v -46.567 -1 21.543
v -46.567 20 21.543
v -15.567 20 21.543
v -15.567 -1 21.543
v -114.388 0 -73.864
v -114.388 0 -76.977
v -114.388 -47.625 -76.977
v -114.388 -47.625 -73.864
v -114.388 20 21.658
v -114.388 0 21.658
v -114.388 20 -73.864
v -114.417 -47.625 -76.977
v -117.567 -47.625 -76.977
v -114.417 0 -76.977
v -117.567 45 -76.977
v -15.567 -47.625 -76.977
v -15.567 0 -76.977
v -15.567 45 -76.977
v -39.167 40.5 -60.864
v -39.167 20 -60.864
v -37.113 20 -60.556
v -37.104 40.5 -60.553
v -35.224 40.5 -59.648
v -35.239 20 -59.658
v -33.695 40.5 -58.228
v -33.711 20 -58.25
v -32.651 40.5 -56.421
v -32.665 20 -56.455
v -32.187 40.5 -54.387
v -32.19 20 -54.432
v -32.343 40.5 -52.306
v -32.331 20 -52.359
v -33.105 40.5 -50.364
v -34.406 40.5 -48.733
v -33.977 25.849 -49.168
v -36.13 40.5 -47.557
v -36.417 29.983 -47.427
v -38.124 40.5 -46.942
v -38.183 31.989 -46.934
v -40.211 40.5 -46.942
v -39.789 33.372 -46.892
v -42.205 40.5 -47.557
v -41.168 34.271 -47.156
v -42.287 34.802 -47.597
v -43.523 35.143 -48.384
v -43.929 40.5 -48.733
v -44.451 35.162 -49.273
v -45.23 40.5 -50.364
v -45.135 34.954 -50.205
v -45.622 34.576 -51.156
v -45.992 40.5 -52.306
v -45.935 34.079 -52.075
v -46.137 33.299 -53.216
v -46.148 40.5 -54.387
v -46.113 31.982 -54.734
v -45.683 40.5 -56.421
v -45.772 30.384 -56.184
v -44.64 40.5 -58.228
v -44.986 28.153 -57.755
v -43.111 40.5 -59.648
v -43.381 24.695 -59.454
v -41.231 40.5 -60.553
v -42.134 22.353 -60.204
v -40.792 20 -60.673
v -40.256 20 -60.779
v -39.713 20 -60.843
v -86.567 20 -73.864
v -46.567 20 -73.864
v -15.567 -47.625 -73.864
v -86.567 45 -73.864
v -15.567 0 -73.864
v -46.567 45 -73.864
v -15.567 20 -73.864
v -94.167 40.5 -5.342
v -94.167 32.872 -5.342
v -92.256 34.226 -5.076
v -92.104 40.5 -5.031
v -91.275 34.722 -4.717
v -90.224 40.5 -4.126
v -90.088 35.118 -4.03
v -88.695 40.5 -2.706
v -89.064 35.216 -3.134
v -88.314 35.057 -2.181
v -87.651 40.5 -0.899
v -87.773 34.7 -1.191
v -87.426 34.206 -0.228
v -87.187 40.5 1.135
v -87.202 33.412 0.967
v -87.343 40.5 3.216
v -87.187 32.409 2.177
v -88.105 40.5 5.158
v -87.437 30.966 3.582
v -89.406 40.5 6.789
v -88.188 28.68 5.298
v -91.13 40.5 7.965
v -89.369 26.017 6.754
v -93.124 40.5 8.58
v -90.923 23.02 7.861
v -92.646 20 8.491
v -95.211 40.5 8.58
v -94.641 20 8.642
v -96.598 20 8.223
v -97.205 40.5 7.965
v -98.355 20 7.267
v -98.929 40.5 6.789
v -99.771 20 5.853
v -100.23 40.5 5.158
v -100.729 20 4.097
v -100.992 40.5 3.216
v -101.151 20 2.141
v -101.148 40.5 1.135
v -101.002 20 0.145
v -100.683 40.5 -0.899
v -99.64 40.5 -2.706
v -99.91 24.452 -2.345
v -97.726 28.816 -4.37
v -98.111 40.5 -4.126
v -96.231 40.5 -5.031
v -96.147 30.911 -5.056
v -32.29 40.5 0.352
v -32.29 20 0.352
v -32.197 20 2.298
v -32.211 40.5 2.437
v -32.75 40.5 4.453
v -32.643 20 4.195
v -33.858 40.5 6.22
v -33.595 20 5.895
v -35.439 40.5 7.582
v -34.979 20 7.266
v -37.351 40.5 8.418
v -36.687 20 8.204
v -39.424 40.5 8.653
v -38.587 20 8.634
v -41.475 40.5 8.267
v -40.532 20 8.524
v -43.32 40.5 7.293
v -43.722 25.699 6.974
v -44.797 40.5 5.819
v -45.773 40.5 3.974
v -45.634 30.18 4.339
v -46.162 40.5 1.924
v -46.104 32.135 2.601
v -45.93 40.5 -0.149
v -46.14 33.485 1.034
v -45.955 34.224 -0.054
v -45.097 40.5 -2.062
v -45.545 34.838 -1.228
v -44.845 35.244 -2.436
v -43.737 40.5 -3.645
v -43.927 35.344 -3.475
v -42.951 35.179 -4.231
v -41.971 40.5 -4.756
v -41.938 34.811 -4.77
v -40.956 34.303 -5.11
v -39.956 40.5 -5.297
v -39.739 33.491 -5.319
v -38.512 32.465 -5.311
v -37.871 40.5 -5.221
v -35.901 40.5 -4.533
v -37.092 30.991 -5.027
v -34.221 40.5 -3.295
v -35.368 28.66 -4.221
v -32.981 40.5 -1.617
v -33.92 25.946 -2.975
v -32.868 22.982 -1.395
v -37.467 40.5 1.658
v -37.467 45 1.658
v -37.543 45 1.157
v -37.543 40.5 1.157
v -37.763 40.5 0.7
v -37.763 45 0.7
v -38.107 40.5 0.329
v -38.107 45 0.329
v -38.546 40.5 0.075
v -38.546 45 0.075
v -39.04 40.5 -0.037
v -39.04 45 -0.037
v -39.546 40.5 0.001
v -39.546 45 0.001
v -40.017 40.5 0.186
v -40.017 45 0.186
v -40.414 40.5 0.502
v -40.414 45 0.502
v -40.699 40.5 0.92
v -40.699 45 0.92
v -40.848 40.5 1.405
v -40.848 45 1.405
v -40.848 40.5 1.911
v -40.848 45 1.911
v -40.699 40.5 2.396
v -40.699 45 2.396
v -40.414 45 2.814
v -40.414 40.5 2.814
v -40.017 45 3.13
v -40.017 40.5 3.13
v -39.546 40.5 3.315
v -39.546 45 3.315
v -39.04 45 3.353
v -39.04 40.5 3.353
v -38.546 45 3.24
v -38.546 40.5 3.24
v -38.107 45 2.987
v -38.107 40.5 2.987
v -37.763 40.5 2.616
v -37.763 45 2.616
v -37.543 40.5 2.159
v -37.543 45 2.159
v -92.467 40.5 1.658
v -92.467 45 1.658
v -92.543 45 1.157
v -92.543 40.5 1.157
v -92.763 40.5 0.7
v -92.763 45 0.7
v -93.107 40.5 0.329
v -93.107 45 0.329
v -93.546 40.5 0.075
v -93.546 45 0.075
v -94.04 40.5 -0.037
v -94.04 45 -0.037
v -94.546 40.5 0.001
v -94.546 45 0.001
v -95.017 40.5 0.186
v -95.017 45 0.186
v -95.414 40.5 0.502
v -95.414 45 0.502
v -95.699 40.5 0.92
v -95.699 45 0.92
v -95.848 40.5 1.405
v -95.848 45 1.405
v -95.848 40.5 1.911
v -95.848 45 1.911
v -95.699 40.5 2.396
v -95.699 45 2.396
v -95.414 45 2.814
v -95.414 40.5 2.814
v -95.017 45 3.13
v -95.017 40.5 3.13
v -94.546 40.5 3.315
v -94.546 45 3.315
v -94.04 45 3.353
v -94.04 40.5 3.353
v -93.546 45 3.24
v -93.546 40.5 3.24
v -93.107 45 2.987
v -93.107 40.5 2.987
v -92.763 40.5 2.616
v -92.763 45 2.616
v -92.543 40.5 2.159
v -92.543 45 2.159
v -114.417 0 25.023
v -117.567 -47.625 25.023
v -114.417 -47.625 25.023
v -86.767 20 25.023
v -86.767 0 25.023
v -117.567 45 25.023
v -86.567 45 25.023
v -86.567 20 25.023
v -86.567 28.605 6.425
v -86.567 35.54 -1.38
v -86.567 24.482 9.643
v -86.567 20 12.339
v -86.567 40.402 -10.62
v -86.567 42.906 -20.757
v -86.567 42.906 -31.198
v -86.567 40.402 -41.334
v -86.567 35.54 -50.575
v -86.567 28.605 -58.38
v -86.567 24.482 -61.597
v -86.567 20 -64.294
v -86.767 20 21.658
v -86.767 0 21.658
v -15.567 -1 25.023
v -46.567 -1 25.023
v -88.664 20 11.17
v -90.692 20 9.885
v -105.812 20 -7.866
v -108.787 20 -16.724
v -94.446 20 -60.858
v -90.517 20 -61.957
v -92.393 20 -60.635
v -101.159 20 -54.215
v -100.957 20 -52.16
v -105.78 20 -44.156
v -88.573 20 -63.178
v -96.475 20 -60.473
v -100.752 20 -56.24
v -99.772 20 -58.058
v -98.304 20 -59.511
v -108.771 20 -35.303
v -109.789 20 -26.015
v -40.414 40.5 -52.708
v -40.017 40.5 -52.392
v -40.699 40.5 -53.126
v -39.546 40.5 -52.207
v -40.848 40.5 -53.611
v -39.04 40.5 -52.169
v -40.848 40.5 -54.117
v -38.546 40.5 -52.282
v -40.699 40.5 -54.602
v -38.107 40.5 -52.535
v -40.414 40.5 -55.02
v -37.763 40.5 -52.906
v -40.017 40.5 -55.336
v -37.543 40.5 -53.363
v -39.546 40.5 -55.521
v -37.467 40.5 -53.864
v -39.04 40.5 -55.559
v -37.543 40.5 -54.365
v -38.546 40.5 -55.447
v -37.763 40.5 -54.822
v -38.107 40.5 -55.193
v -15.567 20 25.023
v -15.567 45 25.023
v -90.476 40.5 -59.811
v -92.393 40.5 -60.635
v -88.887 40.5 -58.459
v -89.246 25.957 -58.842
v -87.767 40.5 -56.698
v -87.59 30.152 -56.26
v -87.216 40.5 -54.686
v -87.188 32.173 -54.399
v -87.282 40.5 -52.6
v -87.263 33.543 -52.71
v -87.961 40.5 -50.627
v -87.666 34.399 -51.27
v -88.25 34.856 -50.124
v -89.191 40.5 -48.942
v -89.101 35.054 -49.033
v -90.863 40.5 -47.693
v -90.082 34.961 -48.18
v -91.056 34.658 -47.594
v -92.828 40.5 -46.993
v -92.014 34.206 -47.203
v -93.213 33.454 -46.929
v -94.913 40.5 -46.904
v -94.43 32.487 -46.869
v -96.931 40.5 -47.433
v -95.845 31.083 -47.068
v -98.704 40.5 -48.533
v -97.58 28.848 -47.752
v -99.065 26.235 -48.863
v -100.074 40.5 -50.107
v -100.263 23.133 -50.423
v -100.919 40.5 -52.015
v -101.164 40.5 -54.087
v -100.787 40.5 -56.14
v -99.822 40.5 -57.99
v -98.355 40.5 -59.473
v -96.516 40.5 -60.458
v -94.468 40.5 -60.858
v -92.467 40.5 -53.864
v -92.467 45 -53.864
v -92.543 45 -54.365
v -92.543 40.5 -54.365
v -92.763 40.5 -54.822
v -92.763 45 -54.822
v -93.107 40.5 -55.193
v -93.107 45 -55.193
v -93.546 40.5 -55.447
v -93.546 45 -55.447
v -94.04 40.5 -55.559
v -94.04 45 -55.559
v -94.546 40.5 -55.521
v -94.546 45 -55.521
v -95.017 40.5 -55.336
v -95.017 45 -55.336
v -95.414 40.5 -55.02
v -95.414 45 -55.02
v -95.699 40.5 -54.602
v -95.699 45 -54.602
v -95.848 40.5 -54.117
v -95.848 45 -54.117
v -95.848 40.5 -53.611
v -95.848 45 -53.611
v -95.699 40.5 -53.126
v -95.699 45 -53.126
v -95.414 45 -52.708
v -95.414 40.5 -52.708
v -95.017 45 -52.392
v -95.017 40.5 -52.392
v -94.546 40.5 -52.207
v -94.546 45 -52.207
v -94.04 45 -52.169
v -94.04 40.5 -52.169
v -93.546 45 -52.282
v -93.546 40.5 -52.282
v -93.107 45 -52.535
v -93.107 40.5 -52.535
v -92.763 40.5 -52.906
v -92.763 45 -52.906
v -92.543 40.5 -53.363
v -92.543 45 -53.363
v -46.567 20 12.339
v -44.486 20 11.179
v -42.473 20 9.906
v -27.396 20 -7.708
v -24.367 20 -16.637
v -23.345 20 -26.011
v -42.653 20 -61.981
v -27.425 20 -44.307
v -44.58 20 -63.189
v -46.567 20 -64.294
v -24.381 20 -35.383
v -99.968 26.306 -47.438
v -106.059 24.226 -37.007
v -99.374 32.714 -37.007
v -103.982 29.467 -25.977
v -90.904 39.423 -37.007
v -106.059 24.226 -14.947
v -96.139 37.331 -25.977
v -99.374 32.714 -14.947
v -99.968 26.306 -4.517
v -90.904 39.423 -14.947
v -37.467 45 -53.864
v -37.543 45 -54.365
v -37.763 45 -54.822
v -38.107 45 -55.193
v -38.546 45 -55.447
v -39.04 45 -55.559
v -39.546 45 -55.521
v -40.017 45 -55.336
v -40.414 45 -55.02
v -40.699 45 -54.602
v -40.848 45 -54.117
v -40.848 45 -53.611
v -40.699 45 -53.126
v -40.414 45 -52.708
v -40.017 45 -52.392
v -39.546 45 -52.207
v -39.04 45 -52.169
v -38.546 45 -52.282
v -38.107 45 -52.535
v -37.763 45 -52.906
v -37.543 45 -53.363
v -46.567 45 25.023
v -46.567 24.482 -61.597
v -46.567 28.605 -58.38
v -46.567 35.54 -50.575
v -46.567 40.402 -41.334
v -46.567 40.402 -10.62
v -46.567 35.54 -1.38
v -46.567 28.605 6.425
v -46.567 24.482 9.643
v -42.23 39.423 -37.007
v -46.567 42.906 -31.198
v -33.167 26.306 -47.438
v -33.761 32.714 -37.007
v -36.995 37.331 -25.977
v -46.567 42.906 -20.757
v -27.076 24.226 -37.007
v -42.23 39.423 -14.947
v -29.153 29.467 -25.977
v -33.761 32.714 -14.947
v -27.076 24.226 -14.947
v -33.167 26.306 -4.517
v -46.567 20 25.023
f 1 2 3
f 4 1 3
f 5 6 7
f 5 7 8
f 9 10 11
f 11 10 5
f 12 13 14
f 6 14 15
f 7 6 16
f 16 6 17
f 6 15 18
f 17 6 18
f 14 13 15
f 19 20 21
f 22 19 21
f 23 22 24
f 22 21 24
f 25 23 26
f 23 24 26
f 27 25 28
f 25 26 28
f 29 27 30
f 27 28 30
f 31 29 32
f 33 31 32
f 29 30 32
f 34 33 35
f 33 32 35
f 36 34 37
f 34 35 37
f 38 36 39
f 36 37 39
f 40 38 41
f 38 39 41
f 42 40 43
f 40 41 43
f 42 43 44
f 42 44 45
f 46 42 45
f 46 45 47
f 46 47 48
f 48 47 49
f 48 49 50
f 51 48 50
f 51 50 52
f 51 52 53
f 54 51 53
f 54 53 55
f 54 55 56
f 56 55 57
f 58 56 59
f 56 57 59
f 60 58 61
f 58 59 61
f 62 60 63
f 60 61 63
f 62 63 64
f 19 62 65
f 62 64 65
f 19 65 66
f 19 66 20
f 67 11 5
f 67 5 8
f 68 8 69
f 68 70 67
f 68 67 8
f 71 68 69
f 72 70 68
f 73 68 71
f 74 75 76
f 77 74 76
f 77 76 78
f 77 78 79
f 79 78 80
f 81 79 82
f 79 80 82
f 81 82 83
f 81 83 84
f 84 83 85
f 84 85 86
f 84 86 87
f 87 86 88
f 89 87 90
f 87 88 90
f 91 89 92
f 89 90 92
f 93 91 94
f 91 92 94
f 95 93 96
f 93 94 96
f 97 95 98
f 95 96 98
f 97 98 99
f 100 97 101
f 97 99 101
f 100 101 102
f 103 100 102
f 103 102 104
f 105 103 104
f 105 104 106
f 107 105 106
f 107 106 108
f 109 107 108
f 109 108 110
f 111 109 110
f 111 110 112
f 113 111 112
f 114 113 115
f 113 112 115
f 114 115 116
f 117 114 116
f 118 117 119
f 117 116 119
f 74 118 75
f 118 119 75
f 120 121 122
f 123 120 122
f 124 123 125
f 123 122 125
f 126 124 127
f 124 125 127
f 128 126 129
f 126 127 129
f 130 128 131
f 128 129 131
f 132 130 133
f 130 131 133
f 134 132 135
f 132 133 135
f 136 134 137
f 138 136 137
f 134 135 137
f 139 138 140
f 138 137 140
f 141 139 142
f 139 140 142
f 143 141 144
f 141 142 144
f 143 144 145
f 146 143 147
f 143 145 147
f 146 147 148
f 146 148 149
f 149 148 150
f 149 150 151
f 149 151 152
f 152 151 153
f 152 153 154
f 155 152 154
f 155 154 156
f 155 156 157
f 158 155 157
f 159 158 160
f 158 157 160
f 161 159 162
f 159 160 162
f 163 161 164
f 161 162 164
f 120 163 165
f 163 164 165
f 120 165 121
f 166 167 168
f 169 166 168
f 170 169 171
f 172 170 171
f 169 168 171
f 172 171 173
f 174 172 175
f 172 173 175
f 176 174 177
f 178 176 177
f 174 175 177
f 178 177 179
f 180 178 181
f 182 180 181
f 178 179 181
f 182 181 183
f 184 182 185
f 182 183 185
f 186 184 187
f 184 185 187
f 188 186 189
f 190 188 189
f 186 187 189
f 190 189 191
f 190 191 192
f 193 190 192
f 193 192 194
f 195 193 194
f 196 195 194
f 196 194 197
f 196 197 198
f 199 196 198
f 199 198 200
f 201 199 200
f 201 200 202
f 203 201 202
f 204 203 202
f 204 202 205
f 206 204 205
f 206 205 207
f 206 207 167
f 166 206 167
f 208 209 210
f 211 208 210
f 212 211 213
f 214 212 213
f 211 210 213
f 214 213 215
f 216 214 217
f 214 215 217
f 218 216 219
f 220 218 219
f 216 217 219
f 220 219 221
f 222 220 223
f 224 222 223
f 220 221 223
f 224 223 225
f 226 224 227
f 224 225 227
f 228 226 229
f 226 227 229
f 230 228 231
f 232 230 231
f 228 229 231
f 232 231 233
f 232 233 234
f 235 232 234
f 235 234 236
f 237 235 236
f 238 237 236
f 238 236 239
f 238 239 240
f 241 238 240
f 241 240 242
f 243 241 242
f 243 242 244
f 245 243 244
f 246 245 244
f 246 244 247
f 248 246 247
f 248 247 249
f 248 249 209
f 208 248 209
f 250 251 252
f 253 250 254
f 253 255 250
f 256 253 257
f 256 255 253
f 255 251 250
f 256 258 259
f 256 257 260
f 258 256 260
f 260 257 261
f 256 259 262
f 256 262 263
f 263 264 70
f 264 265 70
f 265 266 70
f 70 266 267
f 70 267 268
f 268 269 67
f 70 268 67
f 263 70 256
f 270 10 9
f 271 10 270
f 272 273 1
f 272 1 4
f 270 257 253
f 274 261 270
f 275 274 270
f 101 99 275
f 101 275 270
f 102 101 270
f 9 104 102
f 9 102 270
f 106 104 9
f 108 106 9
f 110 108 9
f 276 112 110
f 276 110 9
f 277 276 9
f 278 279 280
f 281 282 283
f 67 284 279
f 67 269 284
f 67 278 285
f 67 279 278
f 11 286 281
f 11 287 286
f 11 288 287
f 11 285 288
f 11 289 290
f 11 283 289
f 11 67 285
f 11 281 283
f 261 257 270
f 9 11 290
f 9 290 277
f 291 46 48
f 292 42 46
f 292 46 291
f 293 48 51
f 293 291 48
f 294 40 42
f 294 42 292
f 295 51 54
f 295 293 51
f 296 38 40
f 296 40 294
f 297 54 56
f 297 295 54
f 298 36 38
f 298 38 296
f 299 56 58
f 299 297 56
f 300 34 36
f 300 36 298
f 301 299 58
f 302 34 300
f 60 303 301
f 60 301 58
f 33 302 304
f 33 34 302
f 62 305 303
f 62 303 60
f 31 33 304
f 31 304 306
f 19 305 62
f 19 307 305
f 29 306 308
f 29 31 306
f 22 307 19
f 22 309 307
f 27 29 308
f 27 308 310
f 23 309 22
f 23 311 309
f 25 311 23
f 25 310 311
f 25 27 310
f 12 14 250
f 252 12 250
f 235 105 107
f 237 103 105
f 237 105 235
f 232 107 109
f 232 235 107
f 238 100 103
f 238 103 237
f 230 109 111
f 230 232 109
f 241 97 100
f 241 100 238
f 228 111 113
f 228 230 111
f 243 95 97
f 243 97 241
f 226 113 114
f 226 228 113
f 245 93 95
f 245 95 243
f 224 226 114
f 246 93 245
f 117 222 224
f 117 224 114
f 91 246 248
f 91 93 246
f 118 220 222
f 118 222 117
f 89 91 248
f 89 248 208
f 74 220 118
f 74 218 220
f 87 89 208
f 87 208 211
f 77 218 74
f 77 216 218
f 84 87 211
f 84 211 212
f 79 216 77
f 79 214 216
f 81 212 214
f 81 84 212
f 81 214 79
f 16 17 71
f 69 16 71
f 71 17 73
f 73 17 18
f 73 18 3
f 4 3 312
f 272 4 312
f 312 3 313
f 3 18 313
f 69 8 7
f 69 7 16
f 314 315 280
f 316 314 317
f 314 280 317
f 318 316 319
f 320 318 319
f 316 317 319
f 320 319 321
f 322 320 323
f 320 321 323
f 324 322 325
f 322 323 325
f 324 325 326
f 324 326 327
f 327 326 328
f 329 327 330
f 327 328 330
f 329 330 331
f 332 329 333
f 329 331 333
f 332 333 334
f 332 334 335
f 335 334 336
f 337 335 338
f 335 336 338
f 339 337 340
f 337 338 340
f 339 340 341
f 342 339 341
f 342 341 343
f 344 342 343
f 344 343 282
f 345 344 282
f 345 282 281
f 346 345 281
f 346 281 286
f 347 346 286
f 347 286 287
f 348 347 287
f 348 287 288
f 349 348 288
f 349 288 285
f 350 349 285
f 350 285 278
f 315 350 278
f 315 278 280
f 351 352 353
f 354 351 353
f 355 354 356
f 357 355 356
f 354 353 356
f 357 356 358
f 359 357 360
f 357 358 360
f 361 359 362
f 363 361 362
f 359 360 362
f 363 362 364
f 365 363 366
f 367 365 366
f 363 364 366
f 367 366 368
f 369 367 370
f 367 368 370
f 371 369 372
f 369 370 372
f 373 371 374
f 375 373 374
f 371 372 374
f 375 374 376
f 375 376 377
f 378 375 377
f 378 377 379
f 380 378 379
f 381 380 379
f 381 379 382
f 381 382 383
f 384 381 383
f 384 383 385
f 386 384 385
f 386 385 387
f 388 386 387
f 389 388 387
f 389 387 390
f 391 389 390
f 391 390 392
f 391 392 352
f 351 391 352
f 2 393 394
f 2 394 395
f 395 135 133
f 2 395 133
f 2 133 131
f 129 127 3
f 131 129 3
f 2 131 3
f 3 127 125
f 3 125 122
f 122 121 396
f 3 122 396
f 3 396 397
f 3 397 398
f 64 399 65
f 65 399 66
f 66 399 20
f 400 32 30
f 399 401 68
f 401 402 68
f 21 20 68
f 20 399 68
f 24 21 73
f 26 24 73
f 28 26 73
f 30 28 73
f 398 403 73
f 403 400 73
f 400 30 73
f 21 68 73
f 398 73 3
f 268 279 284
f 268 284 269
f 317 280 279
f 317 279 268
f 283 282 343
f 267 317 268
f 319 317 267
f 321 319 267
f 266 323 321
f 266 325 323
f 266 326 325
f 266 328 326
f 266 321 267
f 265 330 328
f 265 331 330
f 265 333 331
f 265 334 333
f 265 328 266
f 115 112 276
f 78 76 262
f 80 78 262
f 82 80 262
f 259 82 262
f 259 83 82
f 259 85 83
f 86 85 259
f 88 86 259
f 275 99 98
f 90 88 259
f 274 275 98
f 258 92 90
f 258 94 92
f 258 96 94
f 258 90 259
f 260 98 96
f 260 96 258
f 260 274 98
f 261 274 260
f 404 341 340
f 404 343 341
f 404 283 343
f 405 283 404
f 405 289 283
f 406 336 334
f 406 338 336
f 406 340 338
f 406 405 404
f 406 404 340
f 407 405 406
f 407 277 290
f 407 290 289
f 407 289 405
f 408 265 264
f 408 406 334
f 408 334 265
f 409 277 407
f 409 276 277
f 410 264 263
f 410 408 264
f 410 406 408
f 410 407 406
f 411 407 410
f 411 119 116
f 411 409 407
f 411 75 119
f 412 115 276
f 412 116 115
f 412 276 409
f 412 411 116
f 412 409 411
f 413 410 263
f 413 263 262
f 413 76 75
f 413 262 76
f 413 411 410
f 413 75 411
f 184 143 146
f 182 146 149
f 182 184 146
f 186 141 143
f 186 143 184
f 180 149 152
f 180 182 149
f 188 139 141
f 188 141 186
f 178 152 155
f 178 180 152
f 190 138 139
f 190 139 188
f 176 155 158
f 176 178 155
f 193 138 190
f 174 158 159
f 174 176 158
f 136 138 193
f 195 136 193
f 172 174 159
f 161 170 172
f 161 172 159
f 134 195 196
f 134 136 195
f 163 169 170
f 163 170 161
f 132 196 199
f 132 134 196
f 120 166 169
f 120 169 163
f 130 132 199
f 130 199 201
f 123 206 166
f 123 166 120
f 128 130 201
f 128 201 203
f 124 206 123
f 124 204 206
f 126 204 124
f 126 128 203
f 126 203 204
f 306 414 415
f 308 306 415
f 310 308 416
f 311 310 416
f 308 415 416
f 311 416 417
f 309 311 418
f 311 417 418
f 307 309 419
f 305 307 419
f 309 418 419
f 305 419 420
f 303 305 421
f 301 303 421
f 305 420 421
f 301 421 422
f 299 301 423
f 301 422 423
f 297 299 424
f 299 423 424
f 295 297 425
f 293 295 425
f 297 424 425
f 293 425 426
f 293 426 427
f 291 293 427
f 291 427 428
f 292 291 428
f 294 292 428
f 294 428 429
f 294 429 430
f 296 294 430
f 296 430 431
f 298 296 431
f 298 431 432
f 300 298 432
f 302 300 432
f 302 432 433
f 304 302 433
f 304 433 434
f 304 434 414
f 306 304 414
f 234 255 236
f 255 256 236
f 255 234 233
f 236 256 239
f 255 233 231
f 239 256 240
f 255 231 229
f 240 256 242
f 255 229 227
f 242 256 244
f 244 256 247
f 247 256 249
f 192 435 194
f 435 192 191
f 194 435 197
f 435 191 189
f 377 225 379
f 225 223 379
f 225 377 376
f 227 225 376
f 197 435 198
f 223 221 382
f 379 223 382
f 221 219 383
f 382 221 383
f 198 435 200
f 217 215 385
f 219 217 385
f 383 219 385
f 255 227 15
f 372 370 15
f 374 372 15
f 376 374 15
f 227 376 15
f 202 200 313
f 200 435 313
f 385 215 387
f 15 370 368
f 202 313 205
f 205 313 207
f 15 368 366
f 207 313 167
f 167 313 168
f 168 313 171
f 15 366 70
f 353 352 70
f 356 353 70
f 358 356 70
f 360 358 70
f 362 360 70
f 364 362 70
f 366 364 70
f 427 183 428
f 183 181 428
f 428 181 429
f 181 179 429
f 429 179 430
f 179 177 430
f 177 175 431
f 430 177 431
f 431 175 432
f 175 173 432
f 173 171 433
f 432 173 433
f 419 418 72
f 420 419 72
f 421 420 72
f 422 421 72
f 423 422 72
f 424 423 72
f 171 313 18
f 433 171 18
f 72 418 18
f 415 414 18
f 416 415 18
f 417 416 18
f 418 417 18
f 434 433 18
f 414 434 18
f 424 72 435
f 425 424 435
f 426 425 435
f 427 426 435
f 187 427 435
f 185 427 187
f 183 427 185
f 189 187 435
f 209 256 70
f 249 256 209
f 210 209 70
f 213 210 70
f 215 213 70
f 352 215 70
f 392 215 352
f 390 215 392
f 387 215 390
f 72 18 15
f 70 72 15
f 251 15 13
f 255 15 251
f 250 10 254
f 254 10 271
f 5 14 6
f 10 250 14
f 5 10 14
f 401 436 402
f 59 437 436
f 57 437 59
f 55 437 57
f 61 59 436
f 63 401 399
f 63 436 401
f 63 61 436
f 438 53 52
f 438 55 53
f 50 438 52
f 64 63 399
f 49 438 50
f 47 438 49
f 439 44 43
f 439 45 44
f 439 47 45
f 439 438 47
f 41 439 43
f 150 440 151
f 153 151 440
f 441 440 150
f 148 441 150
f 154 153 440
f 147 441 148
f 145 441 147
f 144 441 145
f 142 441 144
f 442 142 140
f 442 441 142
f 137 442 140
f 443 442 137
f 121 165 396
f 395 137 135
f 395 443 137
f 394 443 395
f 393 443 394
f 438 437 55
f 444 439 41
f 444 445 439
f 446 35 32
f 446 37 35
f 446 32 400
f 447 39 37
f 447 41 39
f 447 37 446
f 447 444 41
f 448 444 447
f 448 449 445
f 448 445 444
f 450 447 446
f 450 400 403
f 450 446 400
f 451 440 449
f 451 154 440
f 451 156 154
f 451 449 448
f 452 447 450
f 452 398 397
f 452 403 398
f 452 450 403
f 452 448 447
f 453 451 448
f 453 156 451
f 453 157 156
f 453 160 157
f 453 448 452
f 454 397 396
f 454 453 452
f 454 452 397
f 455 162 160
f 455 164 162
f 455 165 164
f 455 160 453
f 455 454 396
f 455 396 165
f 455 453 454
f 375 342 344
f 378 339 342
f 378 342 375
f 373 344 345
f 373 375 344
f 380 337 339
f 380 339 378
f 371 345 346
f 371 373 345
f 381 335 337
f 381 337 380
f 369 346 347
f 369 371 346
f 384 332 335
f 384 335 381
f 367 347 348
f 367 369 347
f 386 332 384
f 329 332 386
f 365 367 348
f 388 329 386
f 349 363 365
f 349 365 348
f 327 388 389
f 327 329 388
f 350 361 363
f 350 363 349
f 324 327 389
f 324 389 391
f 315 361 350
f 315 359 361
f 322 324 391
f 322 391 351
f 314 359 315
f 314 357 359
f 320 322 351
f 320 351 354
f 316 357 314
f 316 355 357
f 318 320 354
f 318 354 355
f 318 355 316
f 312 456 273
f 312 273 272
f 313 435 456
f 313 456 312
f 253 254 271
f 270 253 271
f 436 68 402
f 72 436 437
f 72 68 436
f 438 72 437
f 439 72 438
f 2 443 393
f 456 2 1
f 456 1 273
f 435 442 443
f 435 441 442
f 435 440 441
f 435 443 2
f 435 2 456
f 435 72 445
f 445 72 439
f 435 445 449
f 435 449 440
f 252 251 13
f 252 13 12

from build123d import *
from build123d.topology import SkipClean

# Parameters (mm, degrees)
SKETCH1_W                   = 102
SKETCH1_H                   = 102
BOSS_EXTRUDE1_DEPTH         = 50
CUT_EXTRUDE_THIN1_OUTLINE_W = 40
CUT_EXTRUDE_THIN1_OUTLINE_H = 95.773670058
CUT_EXTRUDE_THIN1_DEPTH     = 50
SKETCH4_W                   = 40
SKETCH4_H                   = 6.202657501
CUT_EXTRUDE3_DEPTH          = 54
SKETCH5_W                   = 33.817621941
SKETCH5_H                   = 102.594578927
CUT_EXTRUDE4_DEPTH          = 20
SKETCH6_W                   = 27.820383201
SKETCH6_H                   = 98.886835029
CUT_EXTRUDE5_DEPTH          = 20
SKETCH7_W                   = 30.8
SKETCH7_H                   = 3.364819678
BOSS_EXTRUDE2_DEPTH         = 21
SKETCH9_W                   = 31
SKETCH9_H                   = 3.479961613
BOSS_EXTRUDE4_DEPTH         = 21
SKETCH10_W                  = 3.15002448
SKETCH10_H                  = 102
BOSS_EXTRUDE5_DEPTH         = 47.625
SKETCH11_W                  = 98.820383201
SKETCH11_H                  = 3.113164971
BOSS_EXTRUDE6_DEPTH         = 47.625
SKETCH14_W                  = 102
SKETCH14_H                  = 5
CUT_EXTRUDE7_DEPTH          = 105
SKETCH17_R                  = 7
CUT_EXTRUDE12_DEPTH         = 20.5
M3_CLEARANCE_HOLE1_D        = 3.4


# Read off the part's stored shape, not the designer's step: Cut-Extrude-Thin1
with BuildPart() as part:
    # Sketch1 → Boss-Extrude1 (new body)
    with BuildSketch(Plane(origin=(0, 0, 0), x_dir=(1, 0, 0), z_dir=(0, 1, 0))):
        with Locations((-66.567363259, 25.977216604)):
            Rectangle(SKETCH1_W, SKETCH1_H)
    extrude(amount=BOSS_EXTRUDE1_DEPTH)

    # Sketch2 → Cut-Revolve1 (revolve, cut)
    with SkipClean():  # the faces are left unmerged after this step: merging them gives an invalid solid
        with BuildSketch(Plane(origin=(0, 0, 0), x_dir=(1, 0, 0), z_dir=(0, 1, 0))):
            with BuildLine():
                ThreePointArc((-66.567363259, 73.602216604), (-114.192363259, 25.977216604), (-66.567363259, -21.647783396))
                Line((-66.567363259, -21.647783396), (-66.567363259, 73.602216604))
            make_face()
            with BuildLine():
                Line((-66.567363259, 73.602216604), (-66.567363259, -21.647783396))
                ThreePointArc((-66.567363259, -21.647783396), (-32.891402805, -7.69874385), (-18.942363259, 25.977216604))
                ThreePointArc((-18.942363259, 25.977216604), (-32.891402805, 59.653177058), (-66.567363259, 73.602216604))
            make_face()
        revolve(axis=Axis((-66.567363259, 0, 21.647783396), (0, 0, -1)), mode=Mode.SUBTRACT)
    add(part.part.scale(1), mode=Mode.REPLACE)  # the faces are merged on a copy

    # Cut-Extrude-Thin1 outline → Cut-Extrude-Thin1 (cut)
    with BuildSketch(Plane(origin=(0, 0, 0), x_dir=(1, 0, 0), z_dir=(0, 1, 0))):
        with Locations((-66.567363259, 25.977216604)):
            Rectangle(CUT_EXTRUDE_THIN1_OUTLINE_W, CUT_EXTRUDE_THIN1_OUTLINE_H)
    extrude(amount=CUT_EXTRUDE_THIN1_DEPTH, mode=Mode.SUBTRACT)

    # Sketch4 → Cut-Extrude3 (cut)
    with BuildSketch(Plane(origin=(0, 0, 0), x_dir=(1, 0, 0), z_dir=(0, 1, 0))):
        with Locations((-66.567363259, -25.010947176)):
            Rectangle(SKETCH4_W, SKETCH4_H)
    extrude(amount=CUT_EXTRUDE3_DEPTH, mode=Mode.SUBTRACT)

    # Sketch5 → Cut-Extrude4 (cut)
    with BuildSketch(Plane(origin=(0, 0, 0), x_dir=(1, 0, 0), z_dir=(0, 1, 0))):
        with Locations((-29.658552289, 22.56676217)):
            Rectangle(SKETCH5_W, SKETCH5_H)
    extrude(amount=CUT_EXTRUDE4_DEPTH, mode=Mode.SUBTRACT)

    # Sketch6 → Cut-Extrude5 (cut)
    with BuildSketch(Plane(origin=(0, 0, 0), x_dir=(-1, 0, 0), z_dir=(0, -1, 0))):
        with Locations((100.47755486, 24.420634119)):
            Rectangle(SKETCH6_W, SKETCH6_H)
    extrude(amount=-CUT_EXTRUDE5_DEPTH, mode=Mode.SUBTRACT)

    # Sketch7 → Boss-Extrude2 (add)
    with BuildSketch(Plane(origin=(0, 0, 0), x_dir=(1, 0, 0), z_dir=(0, 1, 0))):
        with Locations((-102.167363259, -23.340373557)):
            Rectangle(SKETCH7_W, SKETCH7_H)
    extrude(amount=BOSS_EXTRUDE2_DEPTH)

    # Sketch9 → Boss-Extrude4 (add)
    with BuildSketch(Plane.XZ.offset(-20)):
        with Locations((-31.067363259, 23.28280259)):
            Rectangle(SKETCH9_W, SKETCH9_H)
    extrude(amount=BOSS_EXTRUDE4_DEPTH)

    # Sketch10 → Boss-Extrude5 (add)
    with BuildSketch(Plane.XZ):
        with Locations((-115.992351019, -25.977216604)):
            Rectangle(SKETCH10_W, SKETCH10_H)
    extrude(amount=BOSS_EXTRUDE5_DEPTH)

    # Sketch11 → Boss-Extrude6 (add)
    with BuildSketch(Plane.XZ):
        with Locations((-64.97755486, -75.420634119)):
            Rectangle(SKETCH11_W, SKETCH11_H)
    extrude(amount=BOSS_EXTRUDE6_DEPTH)

    # Sketch14 → Cut-Extrude7 (cut)
    with BuildSketch(Plane(origin=(-15.567363259, 0, 0), x_dir=(0, 0, -1), z_dir=(1, 0, 0))):
        with Locations((25.977216604, 47.5)):
            Rectangle(SKETCH14_W, SKETCH14_H)
    extrude(amount=-CUT_EXTRUDE7_DEPTH, mode=Mode.SUBTRACT)

    # Sketch17 → Cut-Extrude12 (cut)
    with BuildSketch(Plane.XZ.offset(-20)):
        with Locations(Location((-94.167363259, 1.657963718, 0), (0, 0, 270))):
            Circle(SKETCH17_R)
        with Locations(Location((-94.167363259, -53.864051633, 0), (0, 0, 284.685382437))):
            Circle(SKETCH17_R)
        with Locations(Location((-39.167363259, 1.657963718, 0), (0, 0, 349.246729183))):
            Circle(SKETCH17_R)
        with Locations(Location((-39.167363259, -53.864051633, 0), (0, 0, 270))):
            Circle(SKETCH17_R)
    extrude(amount=-CUT_EXTRUDE12_DEPTH, mode=Mode.SUBTRACT)

    # M3 Clearance Hole1 (through all)
    with Locations(Plane(origin=(0, 40.5, 0), x_dir=(-1, 0, 0), z_dir=(0, -1, 0))):
        with Locations((94.167363259, -1.657963718), (39.167363259, -1.657963718), (39.167363259, 53.864051633), (94.167363259, 53.864051633)):
            Hole(M3_CLEARANCE_HOLE1_D / 2)


solid = part.part
